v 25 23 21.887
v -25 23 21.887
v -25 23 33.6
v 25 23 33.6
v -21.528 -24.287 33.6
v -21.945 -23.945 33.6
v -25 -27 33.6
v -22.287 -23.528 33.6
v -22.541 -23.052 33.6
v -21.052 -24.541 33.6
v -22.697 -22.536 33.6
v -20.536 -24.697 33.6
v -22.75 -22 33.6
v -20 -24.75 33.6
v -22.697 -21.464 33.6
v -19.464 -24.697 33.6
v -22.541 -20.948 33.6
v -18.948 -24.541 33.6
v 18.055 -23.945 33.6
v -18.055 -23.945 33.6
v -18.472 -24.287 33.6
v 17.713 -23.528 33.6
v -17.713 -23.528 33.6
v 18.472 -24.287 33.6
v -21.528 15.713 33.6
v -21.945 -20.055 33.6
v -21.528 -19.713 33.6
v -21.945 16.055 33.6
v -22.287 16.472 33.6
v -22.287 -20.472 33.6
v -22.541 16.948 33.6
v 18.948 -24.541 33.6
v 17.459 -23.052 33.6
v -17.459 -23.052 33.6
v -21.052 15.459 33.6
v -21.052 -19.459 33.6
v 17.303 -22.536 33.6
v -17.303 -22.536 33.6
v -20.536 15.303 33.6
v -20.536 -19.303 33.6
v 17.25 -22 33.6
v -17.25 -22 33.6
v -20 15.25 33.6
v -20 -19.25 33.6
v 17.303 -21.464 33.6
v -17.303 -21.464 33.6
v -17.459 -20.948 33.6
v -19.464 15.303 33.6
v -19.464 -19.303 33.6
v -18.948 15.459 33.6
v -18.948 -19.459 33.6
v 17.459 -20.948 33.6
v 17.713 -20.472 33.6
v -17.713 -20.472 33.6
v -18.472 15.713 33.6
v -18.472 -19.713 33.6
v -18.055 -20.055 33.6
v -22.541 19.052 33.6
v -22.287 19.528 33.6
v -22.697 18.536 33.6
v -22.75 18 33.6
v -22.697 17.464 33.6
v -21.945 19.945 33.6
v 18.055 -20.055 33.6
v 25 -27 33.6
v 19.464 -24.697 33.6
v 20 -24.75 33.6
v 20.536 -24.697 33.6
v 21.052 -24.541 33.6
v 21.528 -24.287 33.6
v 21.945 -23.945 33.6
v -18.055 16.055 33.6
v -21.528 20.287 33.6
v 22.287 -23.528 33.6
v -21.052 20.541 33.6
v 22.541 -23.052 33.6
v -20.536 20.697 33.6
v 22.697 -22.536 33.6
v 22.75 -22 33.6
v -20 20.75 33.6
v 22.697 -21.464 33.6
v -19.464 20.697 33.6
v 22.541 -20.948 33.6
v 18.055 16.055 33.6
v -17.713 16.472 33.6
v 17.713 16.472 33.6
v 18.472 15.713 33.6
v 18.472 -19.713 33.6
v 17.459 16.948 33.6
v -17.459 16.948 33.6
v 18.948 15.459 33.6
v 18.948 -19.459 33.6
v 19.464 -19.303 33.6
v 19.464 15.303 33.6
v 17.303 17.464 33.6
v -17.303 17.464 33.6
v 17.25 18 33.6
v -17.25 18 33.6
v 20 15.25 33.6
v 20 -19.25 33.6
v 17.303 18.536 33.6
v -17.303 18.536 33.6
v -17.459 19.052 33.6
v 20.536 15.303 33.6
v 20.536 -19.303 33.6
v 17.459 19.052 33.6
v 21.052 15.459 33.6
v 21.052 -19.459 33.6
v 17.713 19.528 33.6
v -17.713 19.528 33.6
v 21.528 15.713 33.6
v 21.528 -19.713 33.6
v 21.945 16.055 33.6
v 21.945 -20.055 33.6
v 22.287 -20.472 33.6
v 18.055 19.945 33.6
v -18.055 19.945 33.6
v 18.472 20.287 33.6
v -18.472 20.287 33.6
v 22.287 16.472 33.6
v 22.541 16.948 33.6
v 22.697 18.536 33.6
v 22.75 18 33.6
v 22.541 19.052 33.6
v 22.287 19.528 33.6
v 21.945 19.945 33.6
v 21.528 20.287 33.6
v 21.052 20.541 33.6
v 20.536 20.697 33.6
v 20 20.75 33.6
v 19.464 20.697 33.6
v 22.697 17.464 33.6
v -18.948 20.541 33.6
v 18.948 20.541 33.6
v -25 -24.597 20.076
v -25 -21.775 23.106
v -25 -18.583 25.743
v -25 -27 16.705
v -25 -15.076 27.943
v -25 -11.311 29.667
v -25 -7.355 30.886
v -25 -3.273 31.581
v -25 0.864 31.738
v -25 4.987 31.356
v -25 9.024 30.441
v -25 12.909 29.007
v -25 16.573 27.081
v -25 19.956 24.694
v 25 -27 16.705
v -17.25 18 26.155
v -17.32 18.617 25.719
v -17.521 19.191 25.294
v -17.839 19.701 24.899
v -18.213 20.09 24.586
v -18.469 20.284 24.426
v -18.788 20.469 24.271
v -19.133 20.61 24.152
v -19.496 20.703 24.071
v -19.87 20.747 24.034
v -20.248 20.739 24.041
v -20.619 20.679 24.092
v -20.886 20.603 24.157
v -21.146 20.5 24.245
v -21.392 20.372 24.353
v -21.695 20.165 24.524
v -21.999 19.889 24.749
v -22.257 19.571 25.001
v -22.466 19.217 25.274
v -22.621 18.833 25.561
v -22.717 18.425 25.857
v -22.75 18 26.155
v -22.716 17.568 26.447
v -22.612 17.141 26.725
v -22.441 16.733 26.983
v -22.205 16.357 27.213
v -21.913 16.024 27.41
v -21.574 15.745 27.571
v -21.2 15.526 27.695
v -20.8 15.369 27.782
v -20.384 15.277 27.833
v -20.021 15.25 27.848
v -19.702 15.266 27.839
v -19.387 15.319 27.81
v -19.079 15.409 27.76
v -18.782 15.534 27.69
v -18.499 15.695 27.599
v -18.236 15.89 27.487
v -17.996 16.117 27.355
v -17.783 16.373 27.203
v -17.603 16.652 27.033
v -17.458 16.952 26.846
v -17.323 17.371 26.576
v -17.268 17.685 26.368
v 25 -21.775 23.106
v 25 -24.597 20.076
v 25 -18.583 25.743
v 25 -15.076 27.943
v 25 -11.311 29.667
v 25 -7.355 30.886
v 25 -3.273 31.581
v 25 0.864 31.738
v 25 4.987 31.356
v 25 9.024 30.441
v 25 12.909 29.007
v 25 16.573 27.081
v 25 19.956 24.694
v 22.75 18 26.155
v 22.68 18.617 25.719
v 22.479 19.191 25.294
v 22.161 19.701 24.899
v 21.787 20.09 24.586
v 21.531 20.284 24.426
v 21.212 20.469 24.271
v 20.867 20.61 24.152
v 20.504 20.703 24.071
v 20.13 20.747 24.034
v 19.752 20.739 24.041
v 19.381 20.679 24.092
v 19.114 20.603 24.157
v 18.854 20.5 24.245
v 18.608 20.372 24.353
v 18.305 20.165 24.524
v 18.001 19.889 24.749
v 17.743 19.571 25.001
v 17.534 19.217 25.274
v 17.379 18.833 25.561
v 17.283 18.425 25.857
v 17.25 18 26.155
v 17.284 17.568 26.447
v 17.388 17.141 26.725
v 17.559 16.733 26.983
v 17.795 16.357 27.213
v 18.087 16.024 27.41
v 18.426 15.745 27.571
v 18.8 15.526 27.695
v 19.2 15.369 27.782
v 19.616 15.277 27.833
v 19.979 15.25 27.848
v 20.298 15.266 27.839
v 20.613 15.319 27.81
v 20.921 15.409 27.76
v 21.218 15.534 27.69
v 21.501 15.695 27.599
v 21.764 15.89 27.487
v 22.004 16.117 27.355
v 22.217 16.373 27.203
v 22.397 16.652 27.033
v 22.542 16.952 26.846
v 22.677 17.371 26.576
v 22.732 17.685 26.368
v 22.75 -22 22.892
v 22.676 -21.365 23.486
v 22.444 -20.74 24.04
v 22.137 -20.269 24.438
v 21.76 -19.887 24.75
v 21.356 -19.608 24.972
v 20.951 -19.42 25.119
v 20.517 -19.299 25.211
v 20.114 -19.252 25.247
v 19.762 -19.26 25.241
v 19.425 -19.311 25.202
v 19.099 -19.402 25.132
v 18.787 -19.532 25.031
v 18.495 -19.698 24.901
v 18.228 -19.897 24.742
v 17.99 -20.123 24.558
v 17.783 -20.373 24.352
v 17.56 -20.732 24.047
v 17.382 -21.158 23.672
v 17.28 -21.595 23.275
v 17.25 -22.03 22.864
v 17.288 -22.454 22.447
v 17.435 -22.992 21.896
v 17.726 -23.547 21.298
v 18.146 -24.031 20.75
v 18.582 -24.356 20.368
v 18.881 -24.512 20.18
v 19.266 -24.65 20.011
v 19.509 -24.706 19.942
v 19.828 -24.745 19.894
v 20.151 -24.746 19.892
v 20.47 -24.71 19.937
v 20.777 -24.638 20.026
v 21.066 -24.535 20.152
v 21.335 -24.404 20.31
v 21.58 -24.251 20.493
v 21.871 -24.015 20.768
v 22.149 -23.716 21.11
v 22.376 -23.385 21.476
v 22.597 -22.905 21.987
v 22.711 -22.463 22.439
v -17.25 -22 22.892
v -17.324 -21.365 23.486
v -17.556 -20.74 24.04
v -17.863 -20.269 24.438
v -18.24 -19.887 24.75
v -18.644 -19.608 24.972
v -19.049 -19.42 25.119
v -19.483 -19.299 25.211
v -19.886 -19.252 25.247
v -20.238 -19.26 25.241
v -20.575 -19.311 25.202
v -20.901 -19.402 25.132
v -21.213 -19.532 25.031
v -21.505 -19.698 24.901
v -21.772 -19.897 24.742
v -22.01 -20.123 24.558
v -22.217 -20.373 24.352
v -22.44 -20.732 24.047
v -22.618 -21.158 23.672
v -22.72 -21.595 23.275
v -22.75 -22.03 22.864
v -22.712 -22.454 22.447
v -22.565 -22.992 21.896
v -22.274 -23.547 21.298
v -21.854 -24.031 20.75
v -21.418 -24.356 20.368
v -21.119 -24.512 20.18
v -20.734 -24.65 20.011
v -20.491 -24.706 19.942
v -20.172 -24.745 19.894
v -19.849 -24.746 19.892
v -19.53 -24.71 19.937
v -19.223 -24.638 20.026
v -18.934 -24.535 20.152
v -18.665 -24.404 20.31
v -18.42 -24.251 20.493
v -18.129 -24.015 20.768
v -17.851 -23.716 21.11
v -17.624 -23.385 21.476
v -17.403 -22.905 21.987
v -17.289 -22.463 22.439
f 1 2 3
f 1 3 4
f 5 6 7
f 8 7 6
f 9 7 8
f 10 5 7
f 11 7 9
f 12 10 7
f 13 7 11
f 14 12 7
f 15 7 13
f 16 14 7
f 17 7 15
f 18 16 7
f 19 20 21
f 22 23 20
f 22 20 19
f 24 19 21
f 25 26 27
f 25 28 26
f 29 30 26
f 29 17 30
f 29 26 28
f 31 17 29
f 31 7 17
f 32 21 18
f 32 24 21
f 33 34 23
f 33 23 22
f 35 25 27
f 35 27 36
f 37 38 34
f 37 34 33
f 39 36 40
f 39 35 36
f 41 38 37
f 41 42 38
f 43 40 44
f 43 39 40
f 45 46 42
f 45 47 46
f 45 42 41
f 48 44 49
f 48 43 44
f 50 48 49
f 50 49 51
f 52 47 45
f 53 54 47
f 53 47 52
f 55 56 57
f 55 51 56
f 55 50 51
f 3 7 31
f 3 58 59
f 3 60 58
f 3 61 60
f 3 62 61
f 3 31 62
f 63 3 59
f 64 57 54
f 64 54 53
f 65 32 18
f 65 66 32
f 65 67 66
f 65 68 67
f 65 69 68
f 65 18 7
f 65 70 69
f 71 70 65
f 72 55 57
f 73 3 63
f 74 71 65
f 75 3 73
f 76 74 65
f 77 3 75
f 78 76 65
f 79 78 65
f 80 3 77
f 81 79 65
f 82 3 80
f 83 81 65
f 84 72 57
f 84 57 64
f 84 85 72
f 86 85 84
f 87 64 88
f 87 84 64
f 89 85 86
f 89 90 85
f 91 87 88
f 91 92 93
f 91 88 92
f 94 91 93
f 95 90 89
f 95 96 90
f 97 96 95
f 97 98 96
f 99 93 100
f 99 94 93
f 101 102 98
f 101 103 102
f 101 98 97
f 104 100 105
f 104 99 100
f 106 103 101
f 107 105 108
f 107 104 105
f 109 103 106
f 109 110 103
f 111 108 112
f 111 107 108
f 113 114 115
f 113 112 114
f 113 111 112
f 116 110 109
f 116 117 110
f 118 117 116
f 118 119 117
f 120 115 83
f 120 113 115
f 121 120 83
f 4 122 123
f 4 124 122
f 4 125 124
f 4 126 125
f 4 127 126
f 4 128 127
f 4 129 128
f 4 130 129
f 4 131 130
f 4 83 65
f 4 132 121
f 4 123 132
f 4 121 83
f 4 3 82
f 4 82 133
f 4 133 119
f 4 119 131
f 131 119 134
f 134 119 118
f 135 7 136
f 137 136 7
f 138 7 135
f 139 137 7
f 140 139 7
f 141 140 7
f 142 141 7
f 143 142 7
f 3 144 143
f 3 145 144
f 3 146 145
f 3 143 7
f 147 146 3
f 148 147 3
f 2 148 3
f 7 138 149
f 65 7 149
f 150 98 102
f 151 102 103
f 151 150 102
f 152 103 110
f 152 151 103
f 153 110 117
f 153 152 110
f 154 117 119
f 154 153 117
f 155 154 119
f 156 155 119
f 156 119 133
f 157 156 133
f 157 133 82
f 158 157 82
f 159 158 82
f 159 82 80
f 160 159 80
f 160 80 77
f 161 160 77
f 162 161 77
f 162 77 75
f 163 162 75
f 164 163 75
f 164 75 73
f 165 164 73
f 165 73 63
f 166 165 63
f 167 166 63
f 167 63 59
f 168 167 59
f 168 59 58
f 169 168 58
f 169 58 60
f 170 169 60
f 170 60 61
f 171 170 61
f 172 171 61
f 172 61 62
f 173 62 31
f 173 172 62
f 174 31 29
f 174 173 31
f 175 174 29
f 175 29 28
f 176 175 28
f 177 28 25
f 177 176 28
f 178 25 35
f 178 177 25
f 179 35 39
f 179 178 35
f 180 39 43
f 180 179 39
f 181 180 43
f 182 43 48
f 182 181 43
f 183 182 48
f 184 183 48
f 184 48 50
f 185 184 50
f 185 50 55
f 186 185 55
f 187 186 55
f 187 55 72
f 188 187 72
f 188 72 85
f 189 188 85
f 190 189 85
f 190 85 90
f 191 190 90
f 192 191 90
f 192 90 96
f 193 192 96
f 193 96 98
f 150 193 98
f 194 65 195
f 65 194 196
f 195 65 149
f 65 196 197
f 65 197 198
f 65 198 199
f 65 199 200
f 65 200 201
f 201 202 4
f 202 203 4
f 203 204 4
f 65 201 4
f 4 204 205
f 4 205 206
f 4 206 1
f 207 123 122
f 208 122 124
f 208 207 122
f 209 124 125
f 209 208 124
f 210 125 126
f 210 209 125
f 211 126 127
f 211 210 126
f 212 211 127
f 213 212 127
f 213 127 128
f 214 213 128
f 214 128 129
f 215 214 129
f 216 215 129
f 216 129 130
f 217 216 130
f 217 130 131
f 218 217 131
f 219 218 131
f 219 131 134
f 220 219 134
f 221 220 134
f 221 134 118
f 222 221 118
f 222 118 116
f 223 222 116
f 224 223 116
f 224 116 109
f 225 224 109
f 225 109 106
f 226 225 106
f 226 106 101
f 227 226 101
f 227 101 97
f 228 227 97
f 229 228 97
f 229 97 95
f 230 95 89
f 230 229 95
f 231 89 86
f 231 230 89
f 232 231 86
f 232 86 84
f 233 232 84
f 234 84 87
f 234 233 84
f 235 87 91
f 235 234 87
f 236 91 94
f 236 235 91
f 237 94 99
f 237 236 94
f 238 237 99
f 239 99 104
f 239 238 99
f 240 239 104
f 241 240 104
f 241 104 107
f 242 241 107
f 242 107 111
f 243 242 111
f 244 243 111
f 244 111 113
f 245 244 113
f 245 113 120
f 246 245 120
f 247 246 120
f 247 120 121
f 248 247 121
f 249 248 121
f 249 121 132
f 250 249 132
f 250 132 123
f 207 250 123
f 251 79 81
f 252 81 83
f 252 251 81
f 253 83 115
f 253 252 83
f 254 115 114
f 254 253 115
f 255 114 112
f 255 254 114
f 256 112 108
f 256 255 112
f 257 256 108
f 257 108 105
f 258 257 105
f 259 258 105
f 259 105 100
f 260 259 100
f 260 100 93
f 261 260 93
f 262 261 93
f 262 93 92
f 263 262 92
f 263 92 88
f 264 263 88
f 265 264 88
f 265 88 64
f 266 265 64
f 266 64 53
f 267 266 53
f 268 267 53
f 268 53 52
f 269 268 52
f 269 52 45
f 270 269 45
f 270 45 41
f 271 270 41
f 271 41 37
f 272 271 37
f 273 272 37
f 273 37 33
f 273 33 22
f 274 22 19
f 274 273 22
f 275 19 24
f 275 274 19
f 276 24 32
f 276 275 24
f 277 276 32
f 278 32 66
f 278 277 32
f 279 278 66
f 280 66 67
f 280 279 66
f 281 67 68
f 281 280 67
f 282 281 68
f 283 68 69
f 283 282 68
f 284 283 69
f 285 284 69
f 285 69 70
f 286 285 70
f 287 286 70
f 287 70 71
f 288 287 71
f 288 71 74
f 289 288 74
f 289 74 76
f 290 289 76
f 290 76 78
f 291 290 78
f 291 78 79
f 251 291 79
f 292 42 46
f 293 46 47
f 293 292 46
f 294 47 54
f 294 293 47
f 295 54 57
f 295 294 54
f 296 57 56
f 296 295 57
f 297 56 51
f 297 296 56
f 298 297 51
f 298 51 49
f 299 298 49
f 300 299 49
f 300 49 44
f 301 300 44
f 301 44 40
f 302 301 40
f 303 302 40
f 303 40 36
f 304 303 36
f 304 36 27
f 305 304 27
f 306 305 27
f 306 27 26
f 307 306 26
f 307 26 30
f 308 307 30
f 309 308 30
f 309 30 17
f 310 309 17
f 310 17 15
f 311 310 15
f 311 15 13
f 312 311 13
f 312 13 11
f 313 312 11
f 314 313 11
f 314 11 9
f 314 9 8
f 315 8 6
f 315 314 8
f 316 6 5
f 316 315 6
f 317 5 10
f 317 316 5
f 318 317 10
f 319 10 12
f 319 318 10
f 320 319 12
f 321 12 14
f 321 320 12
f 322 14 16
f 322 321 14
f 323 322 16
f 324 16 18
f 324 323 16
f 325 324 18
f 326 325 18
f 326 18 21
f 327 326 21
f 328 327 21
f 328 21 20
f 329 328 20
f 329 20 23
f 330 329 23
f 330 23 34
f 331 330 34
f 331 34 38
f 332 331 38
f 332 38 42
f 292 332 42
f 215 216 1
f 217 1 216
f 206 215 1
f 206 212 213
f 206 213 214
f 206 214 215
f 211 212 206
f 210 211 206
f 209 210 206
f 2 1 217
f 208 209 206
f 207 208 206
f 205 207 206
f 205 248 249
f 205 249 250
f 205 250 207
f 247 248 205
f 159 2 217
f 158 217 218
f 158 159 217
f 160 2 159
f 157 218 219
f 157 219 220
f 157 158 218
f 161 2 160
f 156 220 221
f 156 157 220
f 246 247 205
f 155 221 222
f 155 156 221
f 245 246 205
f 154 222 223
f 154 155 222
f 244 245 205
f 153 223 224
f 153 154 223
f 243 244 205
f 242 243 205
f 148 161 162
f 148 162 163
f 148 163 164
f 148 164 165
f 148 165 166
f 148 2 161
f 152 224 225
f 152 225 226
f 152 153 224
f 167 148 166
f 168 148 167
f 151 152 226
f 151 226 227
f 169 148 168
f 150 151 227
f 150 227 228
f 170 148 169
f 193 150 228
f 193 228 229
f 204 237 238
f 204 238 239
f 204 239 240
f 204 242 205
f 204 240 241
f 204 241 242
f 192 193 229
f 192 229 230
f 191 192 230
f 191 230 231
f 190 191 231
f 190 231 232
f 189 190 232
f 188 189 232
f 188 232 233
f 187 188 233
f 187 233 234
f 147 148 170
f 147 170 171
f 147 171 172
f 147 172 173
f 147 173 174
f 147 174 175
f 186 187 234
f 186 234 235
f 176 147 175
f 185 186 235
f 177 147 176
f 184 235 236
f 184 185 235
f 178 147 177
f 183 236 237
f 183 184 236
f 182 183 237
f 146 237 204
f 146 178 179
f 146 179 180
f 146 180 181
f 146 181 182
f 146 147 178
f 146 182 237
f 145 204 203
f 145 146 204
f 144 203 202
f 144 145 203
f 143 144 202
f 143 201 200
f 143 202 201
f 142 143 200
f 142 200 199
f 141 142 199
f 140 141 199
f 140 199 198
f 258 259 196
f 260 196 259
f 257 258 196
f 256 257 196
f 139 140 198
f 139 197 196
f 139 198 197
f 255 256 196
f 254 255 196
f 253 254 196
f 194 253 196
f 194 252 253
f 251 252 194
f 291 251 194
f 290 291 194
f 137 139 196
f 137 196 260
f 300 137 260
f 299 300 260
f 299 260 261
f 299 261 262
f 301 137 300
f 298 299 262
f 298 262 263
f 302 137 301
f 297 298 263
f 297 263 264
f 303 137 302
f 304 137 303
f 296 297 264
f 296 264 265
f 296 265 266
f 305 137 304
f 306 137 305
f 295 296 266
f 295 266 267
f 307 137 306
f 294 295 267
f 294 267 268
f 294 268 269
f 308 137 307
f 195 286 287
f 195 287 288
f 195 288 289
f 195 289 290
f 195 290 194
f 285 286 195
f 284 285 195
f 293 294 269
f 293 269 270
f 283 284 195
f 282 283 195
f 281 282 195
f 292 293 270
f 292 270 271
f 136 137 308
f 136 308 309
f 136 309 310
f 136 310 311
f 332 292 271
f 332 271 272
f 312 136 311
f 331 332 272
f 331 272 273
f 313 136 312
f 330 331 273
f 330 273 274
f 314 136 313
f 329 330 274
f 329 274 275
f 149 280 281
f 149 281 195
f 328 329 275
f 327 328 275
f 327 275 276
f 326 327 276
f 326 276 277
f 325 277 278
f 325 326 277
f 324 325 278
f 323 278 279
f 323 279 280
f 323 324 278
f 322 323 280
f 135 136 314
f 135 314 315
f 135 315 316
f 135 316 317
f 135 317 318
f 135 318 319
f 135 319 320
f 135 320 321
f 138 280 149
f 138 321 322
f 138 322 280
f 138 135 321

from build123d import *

# Parameters (mm, degrees)
SKETCH1_W               = 50
SKETCH1_H               = 50
SKETCH1_R               = 2.75
BOSS_EXTRUDE1_DEPTH     = 33.6
CUT_EXTRUDE1_DEPTH      = 50.829308645
CUT_EXTRUDE1_DEPTH_BACK = 50.829308645
SKETCH2_R               = 31.75


with BuildPart() as part:
    # Sketch1 → Boss-Extrude1 (new body)
    with BuildSketch(Plane.XY):
        with Locations((0, -2)):
            Rectangle(SKETCH1_W, SKETCH1_H)
        with Locations((-20, 18)):
            Circle(SKETCH1_R, mode=Mode.SUBTRACT)
        with Locations((20, 18)):
            Circle(SKETCH1_R, mode=Mode.SUBTRACT)
        with Locations((20, -22)):
            Circle(SKETCH1_R, mode=Mode.SUBTRACT)
        with Locations((-20, -22)):
            Circle(SKETCH1_R, mode=Mode.SUBTRACT)
    extrude(amount=BOSS_EXTRUDE1_DEPTH)

    # Sketch2 → Cut-Extrude1 (cut, two sides: drawn at the far end of the back side and taken through both)
    with BuildSketch(Plane(origin=(0, 0, 0), x_dir=(0, 0, -1), z_dir=(1, 0, 0)).offset(-CUT_EXTRUDE1_DEPTH_BACK)):
        Circle(SKETCH2_R)
    extrude(amount=CUT_EXTRUDE1_DEPTH + CUT_EXTRUDE1_DEPTH_BACK, mode=Mode.SUBTRACT)


solid = part.part
